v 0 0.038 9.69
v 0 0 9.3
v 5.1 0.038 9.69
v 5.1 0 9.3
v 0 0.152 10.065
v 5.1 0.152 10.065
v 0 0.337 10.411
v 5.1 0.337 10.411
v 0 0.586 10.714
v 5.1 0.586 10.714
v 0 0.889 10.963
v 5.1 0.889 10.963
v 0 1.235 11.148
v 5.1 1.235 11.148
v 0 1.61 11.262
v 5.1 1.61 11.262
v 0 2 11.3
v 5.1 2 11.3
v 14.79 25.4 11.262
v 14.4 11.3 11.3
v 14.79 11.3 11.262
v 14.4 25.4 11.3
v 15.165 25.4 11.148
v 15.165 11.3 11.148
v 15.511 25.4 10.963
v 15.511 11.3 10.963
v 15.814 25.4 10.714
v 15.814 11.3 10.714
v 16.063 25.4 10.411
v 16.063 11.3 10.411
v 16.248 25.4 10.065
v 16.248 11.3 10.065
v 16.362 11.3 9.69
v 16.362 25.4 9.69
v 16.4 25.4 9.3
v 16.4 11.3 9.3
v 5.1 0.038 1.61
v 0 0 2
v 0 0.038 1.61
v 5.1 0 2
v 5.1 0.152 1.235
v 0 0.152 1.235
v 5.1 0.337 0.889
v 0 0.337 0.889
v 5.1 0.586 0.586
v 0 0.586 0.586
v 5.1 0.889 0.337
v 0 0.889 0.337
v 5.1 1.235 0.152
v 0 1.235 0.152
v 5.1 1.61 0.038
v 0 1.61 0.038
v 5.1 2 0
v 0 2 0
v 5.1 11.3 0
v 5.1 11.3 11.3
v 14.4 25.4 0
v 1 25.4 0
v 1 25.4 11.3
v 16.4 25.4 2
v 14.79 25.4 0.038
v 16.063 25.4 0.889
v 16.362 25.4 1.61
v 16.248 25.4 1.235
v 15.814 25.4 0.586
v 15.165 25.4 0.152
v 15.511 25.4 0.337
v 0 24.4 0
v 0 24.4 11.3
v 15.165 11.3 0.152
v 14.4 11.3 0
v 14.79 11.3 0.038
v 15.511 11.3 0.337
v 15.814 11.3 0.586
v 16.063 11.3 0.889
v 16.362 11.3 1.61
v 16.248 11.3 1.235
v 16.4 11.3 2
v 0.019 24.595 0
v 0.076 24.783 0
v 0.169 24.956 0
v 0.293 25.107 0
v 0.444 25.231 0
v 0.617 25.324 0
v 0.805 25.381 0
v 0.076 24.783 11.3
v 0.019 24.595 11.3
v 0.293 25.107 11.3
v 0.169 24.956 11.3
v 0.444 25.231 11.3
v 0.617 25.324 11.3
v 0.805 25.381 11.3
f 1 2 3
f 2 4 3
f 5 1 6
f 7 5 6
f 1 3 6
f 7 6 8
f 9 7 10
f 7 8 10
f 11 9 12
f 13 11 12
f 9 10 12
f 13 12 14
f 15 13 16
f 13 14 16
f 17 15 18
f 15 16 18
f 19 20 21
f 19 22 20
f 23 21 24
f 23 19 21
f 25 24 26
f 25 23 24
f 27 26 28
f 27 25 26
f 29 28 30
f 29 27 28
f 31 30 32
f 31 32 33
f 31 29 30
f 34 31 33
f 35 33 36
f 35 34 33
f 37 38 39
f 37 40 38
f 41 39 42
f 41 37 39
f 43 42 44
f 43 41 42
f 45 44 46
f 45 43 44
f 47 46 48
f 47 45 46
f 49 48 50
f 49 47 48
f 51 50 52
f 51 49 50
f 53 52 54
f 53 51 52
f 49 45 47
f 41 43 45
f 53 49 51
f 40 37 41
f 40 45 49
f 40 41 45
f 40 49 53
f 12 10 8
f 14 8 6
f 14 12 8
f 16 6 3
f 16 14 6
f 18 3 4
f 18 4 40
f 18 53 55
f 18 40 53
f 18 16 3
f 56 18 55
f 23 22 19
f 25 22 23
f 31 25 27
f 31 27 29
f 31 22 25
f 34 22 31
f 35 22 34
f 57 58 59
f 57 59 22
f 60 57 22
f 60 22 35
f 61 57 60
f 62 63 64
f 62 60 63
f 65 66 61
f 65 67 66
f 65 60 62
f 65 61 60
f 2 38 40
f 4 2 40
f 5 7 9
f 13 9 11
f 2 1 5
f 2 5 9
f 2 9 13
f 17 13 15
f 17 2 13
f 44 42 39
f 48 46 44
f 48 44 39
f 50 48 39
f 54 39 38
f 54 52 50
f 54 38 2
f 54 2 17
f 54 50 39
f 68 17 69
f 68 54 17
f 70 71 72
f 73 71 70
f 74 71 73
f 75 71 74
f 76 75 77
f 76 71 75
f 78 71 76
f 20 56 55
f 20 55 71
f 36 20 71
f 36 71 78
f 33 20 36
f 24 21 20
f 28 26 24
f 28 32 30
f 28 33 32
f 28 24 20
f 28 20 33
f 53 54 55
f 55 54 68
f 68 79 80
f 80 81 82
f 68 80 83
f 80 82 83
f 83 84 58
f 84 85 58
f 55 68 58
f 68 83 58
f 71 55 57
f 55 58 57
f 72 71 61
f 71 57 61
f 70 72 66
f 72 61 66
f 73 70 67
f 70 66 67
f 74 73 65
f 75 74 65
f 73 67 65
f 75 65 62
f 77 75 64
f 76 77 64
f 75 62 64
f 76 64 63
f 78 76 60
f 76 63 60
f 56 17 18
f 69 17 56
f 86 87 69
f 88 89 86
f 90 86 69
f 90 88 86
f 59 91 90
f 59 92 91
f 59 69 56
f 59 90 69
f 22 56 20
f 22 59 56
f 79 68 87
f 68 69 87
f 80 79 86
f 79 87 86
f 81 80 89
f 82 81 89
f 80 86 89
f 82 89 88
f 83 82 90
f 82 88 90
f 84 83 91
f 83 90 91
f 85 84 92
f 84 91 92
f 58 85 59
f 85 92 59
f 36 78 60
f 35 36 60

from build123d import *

# Parameters (mm, degrees)
F0_W     = 16.4
F0_H     = 25.4
F1_DEPTH = 11.3
F2_W     = 11.3
F2_H     = 11.3
F3_DEPTH = 25
F4_R     = 2
F5_R     = 1


with BuildPart() as f1:
    # F0 (on Top) → F1 (new body)
    with BuildSketch(Plane.XY):
        with Locations((8.2, 12.7)):
            Rectangle(F0_W, F0_H)
    extrude(amount=F1_DEPTH)

    # F2 (on face) → F3 (cut)
    with BuildSketch(Plane.XY.offset(11.3)):
        with Locations((10.75, 5.65)):
            Rectangle(F2_W, F2_H)
    extrude(amount=-F3_DEPTH, mode=Mode.SUBTRACT)

    # F4
    f4_edges = [f1.edges().sort_by_distance(p)[0] for p in [
        (16.4, 18.35, 0),
        (2.55, 0, 0),
        (2.55, 0, 11.3),
        (16.4, 18.35, 11.3),
    ]]
    fillet(f4_edges, radius=F4_R)

    # F5
    f5_edges = [f1.edges().sort_by_distance(p)[0] for p in [
        (0, 25.4, 5.65),
    ]]
    fillet(f5_edges, radius=F5_R)


solid = f1.part
